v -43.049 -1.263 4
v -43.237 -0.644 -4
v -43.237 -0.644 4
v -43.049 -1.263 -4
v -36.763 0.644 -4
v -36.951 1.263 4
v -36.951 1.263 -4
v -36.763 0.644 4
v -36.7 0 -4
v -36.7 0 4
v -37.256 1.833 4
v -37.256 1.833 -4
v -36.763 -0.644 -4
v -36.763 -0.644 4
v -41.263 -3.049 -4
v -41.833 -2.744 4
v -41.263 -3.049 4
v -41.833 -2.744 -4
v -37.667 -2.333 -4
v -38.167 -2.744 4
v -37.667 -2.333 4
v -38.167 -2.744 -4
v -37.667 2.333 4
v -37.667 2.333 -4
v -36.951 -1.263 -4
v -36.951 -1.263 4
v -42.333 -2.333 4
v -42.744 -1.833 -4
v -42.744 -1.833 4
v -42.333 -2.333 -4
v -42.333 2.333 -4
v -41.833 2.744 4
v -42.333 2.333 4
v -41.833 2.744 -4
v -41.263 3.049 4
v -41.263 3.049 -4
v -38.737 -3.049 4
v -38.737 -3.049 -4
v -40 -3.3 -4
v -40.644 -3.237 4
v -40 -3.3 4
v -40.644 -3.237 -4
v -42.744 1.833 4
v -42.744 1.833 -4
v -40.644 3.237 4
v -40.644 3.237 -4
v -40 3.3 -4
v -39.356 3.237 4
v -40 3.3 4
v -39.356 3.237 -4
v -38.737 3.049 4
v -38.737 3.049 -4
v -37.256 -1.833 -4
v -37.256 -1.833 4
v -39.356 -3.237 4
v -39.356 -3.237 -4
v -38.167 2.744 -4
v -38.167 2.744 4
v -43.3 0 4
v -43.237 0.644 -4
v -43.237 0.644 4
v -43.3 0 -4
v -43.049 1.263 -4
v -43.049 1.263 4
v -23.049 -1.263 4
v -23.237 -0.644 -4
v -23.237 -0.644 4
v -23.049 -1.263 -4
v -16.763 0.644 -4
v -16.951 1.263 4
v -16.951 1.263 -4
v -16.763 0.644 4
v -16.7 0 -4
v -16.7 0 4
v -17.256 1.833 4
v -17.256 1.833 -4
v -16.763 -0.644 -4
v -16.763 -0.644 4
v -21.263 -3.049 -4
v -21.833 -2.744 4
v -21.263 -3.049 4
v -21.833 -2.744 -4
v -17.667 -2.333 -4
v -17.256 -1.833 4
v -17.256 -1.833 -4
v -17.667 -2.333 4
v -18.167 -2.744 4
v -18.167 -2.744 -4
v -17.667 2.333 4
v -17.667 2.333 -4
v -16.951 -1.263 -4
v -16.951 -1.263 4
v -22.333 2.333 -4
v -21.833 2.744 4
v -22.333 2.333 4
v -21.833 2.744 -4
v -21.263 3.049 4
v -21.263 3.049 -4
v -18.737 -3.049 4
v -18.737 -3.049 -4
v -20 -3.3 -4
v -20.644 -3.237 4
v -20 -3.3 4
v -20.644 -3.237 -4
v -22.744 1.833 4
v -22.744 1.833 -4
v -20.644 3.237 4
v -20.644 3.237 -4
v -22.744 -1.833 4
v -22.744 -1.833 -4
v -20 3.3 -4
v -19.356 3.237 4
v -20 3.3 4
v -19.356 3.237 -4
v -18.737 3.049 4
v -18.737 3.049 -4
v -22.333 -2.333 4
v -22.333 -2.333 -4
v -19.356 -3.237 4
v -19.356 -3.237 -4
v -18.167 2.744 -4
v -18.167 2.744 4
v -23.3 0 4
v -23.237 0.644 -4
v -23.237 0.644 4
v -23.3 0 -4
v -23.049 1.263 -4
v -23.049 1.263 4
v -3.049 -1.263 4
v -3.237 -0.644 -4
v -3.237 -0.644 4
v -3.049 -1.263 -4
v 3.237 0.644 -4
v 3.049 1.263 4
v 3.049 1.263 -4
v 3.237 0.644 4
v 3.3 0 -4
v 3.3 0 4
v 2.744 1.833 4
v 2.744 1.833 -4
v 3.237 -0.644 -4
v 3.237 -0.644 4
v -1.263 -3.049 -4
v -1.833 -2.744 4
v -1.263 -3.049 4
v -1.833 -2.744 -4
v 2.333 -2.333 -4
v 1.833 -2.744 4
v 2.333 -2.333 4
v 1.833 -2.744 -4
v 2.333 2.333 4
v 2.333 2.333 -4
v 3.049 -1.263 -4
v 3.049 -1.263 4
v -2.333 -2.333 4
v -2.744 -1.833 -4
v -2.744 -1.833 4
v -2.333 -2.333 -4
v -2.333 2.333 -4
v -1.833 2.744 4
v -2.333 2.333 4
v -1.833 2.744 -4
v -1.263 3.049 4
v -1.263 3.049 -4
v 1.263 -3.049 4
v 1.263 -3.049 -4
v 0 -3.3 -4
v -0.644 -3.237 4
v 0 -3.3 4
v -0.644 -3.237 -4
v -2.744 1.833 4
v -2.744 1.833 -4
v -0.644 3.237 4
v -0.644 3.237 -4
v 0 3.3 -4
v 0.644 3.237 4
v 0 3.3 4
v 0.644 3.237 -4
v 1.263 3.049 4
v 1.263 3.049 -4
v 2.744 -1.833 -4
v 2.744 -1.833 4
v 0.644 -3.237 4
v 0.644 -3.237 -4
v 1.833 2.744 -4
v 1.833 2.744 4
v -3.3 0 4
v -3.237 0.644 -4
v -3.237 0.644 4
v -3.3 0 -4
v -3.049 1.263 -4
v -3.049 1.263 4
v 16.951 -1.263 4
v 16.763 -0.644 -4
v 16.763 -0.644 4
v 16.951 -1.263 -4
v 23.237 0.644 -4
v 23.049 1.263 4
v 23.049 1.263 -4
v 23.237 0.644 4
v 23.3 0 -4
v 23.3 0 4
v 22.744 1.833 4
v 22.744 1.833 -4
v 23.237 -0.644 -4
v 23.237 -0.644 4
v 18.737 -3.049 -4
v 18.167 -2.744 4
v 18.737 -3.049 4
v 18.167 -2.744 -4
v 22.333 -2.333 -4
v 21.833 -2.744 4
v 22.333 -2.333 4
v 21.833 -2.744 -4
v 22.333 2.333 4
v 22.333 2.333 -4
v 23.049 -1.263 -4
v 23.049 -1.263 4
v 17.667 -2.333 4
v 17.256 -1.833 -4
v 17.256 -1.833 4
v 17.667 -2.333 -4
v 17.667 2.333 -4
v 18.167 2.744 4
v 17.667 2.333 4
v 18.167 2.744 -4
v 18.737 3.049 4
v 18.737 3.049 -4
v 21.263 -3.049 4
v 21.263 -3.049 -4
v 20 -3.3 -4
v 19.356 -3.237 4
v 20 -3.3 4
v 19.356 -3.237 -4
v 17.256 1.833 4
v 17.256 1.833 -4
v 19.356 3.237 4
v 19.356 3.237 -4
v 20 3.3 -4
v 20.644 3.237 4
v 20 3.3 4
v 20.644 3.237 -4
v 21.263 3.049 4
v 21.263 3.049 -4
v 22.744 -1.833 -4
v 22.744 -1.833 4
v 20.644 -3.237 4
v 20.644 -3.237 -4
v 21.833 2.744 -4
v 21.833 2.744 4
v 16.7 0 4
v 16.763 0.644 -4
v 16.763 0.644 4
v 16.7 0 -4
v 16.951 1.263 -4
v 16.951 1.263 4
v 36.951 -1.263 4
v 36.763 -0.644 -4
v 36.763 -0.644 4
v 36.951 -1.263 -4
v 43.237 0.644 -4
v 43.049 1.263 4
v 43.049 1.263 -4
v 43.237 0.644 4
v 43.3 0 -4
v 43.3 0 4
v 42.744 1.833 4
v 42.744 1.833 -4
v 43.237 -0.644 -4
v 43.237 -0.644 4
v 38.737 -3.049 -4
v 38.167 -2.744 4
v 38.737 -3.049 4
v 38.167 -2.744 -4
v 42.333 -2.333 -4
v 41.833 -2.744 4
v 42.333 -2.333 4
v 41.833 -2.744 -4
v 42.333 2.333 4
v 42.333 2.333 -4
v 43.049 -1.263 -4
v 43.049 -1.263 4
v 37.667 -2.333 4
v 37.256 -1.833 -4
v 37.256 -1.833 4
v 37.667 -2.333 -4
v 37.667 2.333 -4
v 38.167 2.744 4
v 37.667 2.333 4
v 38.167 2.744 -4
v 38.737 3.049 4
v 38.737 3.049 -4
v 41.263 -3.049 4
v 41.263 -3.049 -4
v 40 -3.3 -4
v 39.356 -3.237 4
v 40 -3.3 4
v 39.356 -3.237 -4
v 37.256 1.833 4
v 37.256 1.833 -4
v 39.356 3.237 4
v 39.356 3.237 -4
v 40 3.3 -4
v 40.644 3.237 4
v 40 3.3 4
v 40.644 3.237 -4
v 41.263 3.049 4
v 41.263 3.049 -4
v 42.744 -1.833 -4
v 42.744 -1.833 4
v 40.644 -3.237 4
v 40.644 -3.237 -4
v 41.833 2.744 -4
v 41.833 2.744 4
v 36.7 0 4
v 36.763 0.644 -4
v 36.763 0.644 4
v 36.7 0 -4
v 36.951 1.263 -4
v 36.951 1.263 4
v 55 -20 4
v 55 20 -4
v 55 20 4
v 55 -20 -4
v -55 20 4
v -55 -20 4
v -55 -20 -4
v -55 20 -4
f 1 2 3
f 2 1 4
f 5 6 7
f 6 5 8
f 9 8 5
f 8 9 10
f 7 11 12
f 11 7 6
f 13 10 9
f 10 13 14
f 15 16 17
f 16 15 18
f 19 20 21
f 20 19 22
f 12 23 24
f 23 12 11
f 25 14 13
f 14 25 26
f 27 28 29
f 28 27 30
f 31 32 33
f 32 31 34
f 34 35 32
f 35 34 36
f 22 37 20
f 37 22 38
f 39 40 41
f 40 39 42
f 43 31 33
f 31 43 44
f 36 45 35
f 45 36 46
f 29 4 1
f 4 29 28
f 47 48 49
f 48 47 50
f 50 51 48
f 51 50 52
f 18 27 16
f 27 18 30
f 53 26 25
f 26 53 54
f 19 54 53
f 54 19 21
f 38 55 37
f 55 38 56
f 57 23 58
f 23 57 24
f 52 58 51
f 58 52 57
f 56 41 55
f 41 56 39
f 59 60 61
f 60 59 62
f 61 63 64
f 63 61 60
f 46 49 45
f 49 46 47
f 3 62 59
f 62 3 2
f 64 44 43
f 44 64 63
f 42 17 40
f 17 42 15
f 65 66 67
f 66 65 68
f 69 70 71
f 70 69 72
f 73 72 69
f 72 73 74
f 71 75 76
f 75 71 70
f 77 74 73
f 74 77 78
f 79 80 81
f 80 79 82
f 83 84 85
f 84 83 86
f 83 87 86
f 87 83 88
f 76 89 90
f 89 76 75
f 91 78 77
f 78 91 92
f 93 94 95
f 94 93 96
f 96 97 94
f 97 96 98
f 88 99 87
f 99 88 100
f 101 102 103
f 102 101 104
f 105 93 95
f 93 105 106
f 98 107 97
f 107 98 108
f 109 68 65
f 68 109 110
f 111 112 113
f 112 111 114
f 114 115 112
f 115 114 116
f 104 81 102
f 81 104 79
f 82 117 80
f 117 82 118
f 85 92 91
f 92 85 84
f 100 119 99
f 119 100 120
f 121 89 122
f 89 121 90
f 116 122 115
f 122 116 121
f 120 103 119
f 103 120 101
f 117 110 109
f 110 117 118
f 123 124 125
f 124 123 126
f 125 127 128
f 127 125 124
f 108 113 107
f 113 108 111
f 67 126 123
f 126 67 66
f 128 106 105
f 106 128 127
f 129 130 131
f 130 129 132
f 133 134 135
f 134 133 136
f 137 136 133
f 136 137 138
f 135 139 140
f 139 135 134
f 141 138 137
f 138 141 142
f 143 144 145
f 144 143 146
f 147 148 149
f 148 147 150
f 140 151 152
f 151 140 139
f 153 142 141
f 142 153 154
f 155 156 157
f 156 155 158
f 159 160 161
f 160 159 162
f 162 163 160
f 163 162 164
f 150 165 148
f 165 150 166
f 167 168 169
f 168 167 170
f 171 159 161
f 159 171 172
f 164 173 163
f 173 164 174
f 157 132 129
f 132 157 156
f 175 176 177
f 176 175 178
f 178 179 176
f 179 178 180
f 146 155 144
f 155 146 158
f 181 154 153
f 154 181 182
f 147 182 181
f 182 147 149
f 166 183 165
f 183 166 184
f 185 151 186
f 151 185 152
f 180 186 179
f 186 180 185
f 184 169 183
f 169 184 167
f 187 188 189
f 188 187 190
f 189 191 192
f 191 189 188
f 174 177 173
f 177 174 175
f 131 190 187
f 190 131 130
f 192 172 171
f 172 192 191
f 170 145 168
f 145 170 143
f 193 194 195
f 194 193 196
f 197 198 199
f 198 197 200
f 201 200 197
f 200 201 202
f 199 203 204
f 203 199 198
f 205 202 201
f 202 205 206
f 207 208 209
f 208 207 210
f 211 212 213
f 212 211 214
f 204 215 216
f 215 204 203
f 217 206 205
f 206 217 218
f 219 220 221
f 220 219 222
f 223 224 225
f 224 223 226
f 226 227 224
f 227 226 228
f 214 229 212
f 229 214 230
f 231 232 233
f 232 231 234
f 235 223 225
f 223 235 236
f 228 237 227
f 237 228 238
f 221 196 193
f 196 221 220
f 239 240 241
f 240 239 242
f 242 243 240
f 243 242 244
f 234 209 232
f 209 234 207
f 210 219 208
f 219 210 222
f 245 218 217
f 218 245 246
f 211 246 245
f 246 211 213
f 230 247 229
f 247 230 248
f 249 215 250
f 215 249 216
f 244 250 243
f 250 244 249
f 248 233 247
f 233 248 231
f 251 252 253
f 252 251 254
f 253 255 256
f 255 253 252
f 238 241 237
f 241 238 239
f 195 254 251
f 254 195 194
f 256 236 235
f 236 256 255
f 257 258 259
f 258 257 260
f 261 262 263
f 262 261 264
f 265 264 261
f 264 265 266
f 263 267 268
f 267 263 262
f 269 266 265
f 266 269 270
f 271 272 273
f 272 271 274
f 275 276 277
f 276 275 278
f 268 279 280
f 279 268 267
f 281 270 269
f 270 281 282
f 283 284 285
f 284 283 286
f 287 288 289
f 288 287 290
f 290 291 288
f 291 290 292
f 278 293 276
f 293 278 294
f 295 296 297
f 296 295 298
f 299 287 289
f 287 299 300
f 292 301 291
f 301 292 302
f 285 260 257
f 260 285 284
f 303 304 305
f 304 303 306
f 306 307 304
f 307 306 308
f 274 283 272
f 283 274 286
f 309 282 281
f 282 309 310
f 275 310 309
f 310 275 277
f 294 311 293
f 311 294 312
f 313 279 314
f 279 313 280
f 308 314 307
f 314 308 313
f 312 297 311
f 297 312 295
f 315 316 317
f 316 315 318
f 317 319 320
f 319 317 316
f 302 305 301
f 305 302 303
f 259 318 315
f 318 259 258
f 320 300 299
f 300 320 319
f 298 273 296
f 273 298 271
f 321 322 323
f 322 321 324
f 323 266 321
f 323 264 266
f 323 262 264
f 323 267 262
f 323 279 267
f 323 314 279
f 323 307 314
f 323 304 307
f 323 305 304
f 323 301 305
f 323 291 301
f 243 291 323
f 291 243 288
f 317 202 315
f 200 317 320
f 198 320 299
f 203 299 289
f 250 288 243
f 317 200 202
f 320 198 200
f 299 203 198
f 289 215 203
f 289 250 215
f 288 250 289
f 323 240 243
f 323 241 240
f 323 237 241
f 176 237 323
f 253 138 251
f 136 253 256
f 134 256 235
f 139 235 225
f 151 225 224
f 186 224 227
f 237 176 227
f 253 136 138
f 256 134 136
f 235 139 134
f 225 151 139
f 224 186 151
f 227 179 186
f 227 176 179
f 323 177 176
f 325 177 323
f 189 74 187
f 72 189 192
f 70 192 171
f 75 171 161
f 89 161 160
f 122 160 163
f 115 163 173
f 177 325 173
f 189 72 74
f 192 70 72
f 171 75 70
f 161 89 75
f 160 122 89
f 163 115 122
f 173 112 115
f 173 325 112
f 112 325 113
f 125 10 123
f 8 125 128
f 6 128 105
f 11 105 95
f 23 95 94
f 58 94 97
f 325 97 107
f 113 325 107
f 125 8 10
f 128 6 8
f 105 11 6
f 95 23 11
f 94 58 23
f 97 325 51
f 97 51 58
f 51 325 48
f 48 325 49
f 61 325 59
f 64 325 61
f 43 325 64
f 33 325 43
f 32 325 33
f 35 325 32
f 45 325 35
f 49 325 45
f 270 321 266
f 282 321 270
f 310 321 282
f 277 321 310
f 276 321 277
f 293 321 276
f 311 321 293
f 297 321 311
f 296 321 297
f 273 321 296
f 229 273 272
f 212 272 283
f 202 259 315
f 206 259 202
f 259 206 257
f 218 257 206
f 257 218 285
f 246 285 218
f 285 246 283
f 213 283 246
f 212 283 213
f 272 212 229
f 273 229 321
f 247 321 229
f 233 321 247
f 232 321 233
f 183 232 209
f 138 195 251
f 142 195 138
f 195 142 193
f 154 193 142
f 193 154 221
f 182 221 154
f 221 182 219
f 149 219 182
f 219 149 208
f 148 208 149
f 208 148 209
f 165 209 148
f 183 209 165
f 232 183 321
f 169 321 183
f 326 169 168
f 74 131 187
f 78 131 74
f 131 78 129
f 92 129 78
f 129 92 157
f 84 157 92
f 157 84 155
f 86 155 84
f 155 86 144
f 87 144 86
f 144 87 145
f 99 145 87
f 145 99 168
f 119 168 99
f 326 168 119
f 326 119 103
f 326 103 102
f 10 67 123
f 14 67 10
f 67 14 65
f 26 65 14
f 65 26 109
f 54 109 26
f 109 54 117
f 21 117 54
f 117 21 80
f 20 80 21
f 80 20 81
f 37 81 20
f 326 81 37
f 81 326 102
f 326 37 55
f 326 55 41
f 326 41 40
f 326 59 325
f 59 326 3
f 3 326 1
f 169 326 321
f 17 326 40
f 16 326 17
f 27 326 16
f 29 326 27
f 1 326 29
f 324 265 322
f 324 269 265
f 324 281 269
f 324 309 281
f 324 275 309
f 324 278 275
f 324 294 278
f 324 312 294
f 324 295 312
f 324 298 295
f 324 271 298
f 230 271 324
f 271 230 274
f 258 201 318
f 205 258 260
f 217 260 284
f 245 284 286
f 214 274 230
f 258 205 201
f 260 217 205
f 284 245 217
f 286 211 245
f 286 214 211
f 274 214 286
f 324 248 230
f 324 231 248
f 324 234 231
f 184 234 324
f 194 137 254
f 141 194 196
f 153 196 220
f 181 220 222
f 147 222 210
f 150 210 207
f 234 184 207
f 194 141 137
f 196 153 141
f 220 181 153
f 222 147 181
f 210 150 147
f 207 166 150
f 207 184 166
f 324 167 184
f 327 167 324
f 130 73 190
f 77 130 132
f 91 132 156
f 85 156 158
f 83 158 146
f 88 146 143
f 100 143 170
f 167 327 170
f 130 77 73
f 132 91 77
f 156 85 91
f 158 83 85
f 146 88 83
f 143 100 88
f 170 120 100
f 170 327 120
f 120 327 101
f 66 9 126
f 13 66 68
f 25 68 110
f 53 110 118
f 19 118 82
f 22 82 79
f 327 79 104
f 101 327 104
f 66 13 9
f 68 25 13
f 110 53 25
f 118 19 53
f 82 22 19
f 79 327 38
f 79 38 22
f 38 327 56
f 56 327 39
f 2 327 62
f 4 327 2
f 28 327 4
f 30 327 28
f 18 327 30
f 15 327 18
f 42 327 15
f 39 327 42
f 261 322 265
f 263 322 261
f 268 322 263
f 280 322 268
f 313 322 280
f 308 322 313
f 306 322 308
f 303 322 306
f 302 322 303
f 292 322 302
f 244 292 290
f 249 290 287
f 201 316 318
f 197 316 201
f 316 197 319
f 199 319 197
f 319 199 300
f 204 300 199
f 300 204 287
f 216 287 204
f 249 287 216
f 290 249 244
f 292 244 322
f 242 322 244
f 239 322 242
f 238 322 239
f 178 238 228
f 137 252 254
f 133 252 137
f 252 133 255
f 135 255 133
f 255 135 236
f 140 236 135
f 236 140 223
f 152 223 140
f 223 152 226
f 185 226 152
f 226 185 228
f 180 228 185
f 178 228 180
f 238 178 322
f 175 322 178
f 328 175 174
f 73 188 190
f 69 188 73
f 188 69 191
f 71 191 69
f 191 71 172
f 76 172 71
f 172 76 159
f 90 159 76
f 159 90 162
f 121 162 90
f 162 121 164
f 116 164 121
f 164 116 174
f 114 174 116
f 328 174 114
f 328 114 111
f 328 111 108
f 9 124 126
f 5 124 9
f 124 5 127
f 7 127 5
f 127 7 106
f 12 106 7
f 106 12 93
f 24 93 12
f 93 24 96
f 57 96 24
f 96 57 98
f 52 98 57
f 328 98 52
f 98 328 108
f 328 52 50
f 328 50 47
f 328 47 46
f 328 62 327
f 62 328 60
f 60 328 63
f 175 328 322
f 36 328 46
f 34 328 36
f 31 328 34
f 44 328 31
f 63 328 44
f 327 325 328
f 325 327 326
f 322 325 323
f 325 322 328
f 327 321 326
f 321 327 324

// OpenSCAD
$fn = 32;

// ----------------------------------------------------------------------
// Hole bar, 5 x Ø6.6
// row layout, 15 mm edge offset
// ----------------------------------------------------------------------

// --- parameters (mm) ---
bar_w = 40;    // bar width (Y)
bar_t = 8;     // bar thickness (Z)
holes = 5;     // holes per row
hole_d = 6.6;  // hole diameter
edge = 15;     // offset from the bar end to the first hole
pitch = 20;    // pitch between neighbouring holes

// --- derived feature positions (mm) ---
span = (holes - 1) * pitch;   // = 80   distance between the end holes
bar_l = span + 2 * edge;      // = 110   overall bar length
start_x = -bar_l / 2 + edge;  // = -40   X of the first hole
feature_centers = [
  [start_x + 0 * pitch, 0],
  [start_x + 1 * pitch, 0],
  [start_x + 2 * pitch, 0],
  [start_x + 3 * pitch, 0],
  [start_x + 4 * pitch, 0]
];   // hole centres of the first row

// bar with one row of holes, drilled from feature_centers
difference() {
  translate([-bar_l / 2, -bar_w / 2, -bar_t / 2]) cube([bar_l, bar_w, bar_t]);
  for (centre = feature_centers)
    translate([centre[0], centre[1], 0])
      cylinder(d = hole_d, h = bar_t + 2, center = true);
}
